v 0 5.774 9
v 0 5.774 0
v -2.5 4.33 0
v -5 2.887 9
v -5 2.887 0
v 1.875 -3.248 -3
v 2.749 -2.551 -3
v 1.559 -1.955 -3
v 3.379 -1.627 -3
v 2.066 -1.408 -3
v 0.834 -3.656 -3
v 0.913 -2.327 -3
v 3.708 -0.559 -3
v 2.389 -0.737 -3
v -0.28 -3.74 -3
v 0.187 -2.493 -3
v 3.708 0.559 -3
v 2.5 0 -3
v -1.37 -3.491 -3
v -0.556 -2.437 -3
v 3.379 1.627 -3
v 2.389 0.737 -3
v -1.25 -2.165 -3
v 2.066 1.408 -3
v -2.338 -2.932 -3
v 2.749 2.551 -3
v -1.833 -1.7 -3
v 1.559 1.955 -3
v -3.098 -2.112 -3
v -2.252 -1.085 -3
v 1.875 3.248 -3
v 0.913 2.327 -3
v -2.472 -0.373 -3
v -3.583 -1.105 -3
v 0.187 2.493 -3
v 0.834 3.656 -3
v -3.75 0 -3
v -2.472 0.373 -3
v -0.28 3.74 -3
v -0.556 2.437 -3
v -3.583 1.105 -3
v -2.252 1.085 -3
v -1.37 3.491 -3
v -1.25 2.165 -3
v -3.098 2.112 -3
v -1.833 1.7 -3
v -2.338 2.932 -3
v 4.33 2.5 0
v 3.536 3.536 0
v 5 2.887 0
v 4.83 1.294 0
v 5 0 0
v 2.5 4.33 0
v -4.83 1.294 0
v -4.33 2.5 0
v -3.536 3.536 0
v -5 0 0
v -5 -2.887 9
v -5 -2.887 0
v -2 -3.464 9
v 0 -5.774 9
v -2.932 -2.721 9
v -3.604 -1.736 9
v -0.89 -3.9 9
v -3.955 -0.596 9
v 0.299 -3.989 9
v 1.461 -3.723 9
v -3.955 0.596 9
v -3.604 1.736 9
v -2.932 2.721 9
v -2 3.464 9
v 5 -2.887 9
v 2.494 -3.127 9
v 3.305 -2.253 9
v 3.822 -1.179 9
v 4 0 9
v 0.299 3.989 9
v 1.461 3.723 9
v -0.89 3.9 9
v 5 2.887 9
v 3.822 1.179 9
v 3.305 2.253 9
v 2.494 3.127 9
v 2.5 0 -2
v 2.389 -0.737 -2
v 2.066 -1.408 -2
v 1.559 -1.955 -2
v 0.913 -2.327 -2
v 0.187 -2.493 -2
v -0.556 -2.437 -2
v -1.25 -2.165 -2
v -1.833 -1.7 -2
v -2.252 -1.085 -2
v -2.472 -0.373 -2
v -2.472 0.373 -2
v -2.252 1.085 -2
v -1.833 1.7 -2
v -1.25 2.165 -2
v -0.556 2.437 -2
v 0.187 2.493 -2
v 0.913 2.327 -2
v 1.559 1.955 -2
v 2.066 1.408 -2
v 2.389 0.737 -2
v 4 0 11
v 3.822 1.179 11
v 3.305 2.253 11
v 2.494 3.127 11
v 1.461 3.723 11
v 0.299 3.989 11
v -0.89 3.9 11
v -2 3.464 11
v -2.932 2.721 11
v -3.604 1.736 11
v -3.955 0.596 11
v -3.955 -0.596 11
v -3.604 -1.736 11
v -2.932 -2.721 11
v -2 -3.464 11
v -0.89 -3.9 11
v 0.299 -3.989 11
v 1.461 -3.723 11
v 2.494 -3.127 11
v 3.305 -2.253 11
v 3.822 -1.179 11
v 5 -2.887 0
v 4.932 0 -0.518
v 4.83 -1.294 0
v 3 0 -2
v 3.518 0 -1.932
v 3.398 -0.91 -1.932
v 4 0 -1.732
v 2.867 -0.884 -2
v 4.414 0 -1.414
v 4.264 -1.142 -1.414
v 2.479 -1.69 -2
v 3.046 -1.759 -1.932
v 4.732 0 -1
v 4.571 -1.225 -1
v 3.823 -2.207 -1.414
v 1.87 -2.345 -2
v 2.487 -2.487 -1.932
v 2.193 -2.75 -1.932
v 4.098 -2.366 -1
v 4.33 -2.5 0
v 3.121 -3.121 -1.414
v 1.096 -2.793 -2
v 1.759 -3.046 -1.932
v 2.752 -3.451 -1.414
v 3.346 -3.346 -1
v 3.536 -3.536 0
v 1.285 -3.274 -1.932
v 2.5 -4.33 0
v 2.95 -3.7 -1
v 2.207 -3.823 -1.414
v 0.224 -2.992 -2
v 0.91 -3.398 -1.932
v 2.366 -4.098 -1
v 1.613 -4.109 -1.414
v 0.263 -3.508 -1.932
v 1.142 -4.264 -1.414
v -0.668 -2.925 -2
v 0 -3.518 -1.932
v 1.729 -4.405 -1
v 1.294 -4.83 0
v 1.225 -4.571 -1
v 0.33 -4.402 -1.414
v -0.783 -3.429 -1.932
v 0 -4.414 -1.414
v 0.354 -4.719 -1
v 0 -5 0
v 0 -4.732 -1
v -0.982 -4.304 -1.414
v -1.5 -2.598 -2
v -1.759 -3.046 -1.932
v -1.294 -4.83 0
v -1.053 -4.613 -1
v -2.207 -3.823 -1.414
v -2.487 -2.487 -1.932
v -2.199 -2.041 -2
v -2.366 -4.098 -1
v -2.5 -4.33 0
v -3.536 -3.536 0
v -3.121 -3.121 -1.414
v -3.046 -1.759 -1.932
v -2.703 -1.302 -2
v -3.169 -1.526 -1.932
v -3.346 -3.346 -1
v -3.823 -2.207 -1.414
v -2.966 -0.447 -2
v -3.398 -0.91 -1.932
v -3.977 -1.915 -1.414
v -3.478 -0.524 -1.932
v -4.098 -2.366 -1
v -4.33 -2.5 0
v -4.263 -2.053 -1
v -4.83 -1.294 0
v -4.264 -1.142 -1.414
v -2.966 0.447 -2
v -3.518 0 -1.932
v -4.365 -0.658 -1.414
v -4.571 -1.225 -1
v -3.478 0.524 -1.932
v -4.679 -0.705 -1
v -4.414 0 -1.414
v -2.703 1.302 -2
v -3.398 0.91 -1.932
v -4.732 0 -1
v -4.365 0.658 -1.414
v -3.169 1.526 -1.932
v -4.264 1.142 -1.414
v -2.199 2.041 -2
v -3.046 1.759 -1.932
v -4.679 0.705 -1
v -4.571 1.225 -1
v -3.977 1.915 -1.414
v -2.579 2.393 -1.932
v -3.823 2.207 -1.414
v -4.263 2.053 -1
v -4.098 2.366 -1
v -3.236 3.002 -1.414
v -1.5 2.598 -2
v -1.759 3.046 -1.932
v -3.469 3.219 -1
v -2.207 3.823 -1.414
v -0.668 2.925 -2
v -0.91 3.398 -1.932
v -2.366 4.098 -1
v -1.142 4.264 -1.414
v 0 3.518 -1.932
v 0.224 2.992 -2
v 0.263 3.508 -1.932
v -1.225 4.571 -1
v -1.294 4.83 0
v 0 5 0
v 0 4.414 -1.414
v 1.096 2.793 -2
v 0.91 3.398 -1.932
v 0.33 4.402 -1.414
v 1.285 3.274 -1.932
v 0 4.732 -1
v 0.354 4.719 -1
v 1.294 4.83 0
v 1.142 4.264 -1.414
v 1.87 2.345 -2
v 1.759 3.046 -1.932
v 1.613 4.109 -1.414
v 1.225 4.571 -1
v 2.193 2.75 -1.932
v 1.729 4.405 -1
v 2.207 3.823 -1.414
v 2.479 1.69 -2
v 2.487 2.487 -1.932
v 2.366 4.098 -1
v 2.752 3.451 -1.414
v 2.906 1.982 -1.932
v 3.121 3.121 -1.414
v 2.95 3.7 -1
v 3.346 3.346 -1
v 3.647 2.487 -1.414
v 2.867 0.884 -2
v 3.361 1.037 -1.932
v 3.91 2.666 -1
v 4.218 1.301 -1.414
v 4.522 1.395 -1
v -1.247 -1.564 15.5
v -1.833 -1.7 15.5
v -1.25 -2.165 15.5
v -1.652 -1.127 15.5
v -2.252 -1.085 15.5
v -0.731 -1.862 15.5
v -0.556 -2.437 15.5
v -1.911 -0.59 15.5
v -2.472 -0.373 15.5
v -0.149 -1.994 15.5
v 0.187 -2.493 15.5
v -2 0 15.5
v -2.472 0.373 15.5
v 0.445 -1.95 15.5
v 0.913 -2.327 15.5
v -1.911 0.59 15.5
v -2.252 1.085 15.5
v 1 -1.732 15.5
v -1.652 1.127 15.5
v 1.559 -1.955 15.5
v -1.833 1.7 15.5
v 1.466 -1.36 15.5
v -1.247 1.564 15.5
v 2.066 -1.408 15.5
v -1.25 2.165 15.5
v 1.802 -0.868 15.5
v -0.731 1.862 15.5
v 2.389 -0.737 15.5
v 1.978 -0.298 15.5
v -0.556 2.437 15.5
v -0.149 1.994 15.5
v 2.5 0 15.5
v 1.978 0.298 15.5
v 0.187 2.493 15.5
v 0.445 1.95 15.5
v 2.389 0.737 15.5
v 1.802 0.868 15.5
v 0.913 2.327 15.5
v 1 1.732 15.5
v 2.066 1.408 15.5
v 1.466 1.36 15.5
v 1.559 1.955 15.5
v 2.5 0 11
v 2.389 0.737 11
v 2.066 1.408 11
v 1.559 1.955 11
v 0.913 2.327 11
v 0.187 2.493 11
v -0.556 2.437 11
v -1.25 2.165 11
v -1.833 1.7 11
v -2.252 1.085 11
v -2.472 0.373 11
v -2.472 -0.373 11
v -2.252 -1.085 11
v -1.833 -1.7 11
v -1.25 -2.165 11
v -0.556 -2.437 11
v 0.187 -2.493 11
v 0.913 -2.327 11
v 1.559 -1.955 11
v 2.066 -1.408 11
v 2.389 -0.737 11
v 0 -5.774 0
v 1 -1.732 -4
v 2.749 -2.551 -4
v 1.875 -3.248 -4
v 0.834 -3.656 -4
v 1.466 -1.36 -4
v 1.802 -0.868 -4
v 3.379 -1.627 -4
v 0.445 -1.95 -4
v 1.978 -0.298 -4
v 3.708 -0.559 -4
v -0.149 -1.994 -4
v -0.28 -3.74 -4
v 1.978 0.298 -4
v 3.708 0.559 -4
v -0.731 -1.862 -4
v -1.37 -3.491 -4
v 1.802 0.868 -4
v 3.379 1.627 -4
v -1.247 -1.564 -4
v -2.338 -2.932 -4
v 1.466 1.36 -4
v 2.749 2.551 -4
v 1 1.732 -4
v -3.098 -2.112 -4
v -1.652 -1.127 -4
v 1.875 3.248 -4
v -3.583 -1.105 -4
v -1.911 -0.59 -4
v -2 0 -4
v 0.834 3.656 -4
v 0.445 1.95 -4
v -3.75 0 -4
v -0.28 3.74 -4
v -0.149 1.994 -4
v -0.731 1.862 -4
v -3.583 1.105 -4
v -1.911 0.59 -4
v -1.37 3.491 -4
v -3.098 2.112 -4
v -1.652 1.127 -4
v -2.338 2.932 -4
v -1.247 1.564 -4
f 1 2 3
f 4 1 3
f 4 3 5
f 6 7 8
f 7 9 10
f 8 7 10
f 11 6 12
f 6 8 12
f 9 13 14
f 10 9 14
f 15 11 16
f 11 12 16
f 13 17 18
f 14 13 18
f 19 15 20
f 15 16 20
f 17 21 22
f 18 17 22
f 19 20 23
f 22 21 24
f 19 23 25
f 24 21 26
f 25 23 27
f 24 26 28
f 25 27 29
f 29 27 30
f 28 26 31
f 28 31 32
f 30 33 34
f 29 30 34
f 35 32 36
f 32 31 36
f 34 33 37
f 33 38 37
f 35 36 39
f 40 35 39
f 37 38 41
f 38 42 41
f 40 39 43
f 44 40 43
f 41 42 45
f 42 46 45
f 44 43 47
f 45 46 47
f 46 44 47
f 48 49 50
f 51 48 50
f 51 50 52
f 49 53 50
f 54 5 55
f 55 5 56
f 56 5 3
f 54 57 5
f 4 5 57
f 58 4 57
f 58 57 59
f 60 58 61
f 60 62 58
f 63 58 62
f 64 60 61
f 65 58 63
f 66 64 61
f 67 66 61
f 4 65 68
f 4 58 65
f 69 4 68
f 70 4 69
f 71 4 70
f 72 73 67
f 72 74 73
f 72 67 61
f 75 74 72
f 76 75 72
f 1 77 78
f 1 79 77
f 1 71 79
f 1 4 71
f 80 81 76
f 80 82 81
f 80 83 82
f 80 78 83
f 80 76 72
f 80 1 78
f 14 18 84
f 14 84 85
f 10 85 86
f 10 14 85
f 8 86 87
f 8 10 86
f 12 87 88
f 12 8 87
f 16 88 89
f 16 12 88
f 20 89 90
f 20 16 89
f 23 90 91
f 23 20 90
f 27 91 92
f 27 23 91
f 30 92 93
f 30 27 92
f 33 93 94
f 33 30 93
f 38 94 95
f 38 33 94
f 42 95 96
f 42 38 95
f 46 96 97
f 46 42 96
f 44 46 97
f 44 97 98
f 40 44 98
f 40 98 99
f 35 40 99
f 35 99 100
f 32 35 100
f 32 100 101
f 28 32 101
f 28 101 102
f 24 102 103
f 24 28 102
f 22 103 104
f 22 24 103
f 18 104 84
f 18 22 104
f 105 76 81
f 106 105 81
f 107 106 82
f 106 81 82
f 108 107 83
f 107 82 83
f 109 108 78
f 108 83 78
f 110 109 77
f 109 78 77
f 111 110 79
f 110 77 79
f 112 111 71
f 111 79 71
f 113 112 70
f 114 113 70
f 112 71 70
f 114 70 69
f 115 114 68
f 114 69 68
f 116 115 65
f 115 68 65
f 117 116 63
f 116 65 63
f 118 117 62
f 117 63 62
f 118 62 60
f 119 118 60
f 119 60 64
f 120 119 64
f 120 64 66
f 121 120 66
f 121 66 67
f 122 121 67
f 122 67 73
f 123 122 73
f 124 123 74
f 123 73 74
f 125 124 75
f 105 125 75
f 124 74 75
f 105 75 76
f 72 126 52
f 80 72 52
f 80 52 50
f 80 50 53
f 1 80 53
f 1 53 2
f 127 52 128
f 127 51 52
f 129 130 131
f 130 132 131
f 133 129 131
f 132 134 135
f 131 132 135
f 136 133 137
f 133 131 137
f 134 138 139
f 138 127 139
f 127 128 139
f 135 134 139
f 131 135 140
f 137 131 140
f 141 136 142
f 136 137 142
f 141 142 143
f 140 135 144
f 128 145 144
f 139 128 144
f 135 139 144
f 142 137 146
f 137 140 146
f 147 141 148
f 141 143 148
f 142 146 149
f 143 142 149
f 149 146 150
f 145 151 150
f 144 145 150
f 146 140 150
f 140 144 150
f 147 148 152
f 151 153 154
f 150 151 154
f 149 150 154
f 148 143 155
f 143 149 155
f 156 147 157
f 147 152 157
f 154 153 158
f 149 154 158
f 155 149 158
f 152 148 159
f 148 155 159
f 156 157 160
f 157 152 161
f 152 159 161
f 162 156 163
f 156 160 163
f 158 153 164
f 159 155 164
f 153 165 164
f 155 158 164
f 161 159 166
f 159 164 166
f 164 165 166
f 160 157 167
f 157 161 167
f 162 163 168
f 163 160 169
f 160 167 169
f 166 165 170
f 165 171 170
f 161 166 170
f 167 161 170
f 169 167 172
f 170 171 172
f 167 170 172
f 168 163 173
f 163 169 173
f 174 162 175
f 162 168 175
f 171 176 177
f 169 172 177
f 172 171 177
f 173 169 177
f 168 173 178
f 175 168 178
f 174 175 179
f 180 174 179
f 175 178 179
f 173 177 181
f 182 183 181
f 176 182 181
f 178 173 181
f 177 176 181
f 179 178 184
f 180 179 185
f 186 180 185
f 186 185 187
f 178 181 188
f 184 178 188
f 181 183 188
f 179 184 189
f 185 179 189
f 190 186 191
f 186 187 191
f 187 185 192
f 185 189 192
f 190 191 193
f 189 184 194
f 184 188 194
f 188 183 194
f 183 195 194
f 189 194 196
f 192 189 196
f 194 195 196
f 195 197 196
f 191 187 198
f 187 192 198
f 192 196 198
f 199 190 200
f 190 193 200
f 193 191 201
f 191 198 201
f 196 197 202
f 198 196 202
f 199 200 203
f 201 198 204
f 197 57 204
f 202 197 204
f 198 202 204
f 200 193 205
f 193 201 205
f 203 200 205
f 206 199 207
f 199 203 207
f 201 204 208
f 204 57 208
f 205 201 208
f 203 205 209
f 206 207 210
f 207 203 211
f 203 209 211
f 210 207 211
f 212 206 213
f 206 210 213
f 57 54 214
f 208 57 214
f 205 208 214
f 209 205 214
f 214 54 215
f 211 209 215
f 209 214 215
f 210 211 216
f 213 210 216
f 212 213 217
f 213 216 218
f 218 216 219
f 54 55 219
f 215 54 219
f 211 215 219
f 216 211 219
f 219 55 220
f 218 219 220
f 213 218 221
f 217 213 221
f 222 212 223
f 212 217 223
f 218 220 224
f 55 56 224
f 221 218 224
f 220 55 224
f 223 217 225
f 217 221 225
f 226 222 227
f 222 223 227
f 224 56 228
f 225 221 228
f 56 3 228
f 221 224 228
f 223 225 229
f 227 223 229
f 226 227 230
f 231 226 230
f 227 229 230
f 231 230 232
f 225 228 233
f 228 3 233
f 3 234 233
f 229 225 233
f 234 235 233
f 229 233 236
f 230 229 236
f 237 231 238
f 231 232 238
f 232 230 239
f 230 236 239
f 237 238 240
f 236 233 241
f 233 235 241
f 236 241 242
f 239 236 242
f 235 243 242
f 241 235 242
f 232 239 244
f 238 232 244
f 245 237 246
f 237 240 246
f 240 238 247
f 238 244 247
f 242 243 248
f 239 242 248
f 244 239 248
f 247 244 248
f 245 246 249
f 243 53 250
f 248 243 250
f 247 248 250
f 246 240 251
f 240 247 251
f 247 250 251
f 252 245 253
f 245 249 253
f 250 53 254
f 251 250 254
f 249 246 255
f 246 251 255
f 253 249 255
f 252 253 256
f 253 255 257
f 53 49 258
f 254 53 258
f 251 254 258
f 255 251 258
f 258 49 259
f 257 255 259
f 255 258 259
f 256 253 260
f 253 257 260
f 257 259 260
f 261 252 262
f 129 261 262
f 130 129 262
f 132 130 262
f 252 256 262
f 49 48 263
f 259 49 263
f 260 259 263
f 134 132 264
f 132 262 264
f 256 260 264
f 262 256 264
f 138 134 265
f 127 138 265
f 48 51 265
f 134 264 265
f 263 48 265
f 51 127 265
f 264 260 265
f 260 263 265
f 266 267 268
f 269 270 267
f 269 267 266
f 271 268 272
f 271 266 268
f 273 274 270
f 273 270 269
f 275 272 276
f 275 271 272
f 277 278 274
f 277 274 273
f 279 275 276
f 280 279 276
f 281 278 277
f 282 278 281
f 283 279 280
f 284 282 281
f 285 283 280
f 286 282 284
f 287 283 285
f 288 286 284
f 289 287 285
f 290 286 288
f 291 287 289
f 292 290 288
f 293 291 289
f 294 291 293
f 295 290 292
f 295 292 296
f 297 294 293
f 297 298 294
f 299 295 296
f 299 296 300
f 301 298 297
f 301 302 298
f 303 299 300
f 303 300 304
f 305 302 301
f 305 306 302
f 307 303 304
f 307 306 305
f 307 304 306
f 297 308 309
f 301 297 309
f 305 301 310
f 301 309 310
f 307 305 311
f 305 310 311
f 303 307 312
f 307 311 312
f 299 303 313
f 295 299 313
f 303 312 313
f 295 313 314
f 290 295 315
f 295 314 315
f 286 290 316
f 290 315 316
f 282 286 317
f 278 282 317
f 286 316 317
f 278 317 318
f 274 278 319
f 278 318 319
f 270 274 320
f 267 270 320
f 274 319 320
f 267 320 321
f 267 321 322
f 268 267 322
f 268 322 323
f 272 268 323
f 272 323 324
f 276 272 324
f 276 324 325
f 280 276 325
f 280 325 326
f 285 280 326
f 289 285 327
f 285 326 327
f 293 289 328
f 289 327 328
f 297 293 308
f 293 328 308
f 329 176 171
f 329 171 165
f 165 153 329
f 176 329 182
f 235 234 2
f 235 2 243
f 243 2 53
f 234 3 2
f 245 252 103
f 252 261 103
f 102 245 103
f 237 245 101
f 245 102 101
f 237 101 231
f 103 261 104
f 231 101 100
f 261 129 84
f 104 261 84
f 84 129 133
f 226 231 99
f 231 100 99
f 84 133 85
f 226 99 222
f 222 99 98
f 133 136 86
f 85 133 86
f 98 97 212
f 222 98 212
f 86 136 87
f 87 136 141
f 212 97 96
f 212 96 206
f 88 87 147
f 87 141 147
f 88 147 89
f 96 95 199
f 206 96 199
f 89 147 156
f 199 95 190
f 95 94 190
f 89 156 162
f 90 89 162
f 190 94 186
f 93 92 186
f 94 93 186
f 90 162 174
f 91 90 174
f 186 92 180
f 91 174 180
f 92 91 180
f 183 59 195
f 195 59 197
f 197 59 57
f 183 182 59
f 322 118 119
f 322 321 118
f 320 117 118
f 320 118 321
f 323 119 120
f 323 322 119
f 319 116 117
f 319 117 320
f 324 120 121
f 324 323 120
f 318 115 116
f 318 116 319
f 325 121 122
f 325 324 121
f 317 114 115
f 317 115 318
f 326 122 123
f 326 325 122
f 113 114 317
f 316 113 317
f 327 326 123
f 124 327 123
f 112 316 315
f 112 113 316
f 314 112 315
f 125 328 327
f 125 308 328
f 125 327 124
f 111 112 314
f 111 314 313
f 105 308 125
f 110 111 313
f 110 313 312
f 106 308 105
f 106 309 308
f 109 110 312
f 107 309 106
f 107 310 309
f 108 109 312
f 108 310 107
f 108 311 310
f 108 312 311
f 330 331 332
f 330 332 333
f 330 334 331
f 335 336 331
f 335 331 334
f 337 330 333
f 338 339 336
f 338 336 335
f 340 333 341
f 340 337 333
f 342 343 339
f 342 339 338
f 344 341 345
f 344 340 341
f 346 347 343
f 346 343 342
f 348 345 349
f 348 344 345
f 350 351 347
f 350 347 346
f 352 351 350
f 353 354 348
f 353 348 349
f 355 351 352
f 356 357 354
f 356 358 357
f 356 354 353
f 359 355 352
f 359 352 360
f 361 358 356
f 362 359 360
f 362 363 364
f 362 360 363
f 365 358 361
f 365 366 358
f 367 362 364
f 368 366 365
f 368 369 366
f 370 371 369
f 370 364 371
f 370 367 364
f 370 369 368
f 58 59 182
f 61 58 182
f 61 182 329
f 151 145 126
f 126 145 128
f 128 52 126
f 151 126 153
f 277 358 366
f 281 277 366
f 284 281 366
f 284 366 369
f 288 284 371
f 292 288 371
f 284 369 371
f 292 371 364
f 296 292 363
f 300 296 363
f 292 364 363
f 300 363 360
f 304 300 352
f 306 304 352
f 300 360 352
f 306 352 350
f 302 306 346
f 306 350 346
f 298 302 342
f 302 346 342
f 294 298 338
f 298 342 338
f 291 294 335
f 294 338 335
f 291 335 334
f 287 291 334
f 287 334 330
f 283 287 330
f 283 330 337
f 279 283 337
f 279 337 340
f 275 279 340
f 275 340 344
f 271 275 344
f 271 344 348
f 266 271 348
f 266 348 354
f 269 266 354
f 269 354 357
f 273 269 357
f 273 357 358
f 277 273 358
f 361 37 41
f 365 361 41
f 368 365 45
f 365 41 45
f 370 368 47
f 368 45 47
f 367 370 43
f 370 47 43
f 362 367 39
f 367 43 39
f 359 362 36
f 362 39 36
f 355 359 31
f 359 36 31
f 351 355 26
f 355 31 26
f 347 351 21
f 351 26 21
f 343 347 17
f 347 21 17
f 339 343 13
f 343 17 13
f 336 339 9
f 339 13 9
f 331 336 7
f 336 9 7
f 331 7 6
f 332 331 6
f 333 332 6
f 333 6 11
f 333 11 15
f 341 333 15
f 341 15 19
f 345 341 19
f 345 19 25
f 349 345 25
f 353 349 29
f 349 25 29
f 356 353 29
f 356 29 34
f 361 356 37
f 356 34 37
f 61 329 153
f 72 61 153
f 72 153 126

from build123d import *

# Parameters (mm, degrees)
EXTRUDE_1_DEPTH     = 9
SKETCH_2_R          = 4
EXTRUDE_2_DEPTH     = 2
SKETCH_3_R          = 2.5
EXTRUDE_3_DEPTH     = 4.5
EXTRUDE_START       = 1
SKETCH_5_R          = 2.5
EXTRUDE_4_DEPTH     = 1
SKETCH_6_R          = 3.75
EXTRUDE_5_DEPTH     = 1
SKETCH_7_R          = 2
CUT_EXTRUDE_1_DEPTH = 21.942381272


with BuildPart() as part:
    # 草图1 → 凸台-拉伸1 (new body)
    with BuildSketch(Plane.XY):
        Polygon((5, 2.886751346), (0, 5.773502692), (-5, 2.886751346), (-5, -2.886751346), (0, -5.773502692), (5, -2.886751346), align=None)
    extrude(amount=EXTRUDE_1_DEPTH)

    # 草图2 → 凸台-拉伸2 (add)
    with BuildSketch(Plane.XY.offset(9)):
        Circle(SKETCH_2_R)
    extrude(amount=EXTRUDE_2_DEPTH)

    # 草图3 → 凸台-拉伸3 (add)
    with BuildSketch(Plane.XY.offset(11)):
        Circle(SKETCH_3_R)
    extrude(amount=EXTRUDE_3_DEPTH)

    # 草图4 → 旋转1 (revolve)
    with BuildSketch(Plane(origin=(0, 0, 0), x_dir=(1, 0, 0), z_dir=(0, 1, 0))):
        with BuildLine():
            Line((0, 0), (0, 2))
            Line((0, 2), (3, 2))
            ThreePointArc((3, 2), (4.414213562, 1.414213562), (5, 0))
            Line((5, 0), (0, 0))
        make_face()
    revolve(axis=Axis((0, 0, 0), (0, 0, -1)))

    # 草图5 → 凸台-拉伸4 (add)
    with BuildSketch(Plane(origin=(0, 0, -2), x_dir=(-1, 0, 0), z_dir=(0, 0, -1)).offset(EXTRUDE_START)):
        with Locations(Location((0, 0, 0), (0, 0, 180))):
            Circle(SKETCH_5_R)
    extrude(amount=-EXTRUDE_4_DEPTH)

    # 草图6 → 凸台-拉伸5 (add)
    with BuildSketch(Plane(origin=(0, 0, -3), x_dir=(-1, 0, 0), z_dir=(0, 0, -1))):
        Circle(SKETCH_6_R)
    extrude(amount=EXTRUDE_5_DEPTH)

    # 草图7 → 切除-拉伸1 (cut, through all)
    with BuildSketch(Plane(origin=(0, 0, -4), x_dir=(-1, 0, 0), z_dir=(0, 0, -1))):
        Circle(SKETCH_7_R)
    extrude(amount=-CUT_EXTRUDE_1_DEPTH, mode=Mode.SUBTRACT)


solid = part.part
